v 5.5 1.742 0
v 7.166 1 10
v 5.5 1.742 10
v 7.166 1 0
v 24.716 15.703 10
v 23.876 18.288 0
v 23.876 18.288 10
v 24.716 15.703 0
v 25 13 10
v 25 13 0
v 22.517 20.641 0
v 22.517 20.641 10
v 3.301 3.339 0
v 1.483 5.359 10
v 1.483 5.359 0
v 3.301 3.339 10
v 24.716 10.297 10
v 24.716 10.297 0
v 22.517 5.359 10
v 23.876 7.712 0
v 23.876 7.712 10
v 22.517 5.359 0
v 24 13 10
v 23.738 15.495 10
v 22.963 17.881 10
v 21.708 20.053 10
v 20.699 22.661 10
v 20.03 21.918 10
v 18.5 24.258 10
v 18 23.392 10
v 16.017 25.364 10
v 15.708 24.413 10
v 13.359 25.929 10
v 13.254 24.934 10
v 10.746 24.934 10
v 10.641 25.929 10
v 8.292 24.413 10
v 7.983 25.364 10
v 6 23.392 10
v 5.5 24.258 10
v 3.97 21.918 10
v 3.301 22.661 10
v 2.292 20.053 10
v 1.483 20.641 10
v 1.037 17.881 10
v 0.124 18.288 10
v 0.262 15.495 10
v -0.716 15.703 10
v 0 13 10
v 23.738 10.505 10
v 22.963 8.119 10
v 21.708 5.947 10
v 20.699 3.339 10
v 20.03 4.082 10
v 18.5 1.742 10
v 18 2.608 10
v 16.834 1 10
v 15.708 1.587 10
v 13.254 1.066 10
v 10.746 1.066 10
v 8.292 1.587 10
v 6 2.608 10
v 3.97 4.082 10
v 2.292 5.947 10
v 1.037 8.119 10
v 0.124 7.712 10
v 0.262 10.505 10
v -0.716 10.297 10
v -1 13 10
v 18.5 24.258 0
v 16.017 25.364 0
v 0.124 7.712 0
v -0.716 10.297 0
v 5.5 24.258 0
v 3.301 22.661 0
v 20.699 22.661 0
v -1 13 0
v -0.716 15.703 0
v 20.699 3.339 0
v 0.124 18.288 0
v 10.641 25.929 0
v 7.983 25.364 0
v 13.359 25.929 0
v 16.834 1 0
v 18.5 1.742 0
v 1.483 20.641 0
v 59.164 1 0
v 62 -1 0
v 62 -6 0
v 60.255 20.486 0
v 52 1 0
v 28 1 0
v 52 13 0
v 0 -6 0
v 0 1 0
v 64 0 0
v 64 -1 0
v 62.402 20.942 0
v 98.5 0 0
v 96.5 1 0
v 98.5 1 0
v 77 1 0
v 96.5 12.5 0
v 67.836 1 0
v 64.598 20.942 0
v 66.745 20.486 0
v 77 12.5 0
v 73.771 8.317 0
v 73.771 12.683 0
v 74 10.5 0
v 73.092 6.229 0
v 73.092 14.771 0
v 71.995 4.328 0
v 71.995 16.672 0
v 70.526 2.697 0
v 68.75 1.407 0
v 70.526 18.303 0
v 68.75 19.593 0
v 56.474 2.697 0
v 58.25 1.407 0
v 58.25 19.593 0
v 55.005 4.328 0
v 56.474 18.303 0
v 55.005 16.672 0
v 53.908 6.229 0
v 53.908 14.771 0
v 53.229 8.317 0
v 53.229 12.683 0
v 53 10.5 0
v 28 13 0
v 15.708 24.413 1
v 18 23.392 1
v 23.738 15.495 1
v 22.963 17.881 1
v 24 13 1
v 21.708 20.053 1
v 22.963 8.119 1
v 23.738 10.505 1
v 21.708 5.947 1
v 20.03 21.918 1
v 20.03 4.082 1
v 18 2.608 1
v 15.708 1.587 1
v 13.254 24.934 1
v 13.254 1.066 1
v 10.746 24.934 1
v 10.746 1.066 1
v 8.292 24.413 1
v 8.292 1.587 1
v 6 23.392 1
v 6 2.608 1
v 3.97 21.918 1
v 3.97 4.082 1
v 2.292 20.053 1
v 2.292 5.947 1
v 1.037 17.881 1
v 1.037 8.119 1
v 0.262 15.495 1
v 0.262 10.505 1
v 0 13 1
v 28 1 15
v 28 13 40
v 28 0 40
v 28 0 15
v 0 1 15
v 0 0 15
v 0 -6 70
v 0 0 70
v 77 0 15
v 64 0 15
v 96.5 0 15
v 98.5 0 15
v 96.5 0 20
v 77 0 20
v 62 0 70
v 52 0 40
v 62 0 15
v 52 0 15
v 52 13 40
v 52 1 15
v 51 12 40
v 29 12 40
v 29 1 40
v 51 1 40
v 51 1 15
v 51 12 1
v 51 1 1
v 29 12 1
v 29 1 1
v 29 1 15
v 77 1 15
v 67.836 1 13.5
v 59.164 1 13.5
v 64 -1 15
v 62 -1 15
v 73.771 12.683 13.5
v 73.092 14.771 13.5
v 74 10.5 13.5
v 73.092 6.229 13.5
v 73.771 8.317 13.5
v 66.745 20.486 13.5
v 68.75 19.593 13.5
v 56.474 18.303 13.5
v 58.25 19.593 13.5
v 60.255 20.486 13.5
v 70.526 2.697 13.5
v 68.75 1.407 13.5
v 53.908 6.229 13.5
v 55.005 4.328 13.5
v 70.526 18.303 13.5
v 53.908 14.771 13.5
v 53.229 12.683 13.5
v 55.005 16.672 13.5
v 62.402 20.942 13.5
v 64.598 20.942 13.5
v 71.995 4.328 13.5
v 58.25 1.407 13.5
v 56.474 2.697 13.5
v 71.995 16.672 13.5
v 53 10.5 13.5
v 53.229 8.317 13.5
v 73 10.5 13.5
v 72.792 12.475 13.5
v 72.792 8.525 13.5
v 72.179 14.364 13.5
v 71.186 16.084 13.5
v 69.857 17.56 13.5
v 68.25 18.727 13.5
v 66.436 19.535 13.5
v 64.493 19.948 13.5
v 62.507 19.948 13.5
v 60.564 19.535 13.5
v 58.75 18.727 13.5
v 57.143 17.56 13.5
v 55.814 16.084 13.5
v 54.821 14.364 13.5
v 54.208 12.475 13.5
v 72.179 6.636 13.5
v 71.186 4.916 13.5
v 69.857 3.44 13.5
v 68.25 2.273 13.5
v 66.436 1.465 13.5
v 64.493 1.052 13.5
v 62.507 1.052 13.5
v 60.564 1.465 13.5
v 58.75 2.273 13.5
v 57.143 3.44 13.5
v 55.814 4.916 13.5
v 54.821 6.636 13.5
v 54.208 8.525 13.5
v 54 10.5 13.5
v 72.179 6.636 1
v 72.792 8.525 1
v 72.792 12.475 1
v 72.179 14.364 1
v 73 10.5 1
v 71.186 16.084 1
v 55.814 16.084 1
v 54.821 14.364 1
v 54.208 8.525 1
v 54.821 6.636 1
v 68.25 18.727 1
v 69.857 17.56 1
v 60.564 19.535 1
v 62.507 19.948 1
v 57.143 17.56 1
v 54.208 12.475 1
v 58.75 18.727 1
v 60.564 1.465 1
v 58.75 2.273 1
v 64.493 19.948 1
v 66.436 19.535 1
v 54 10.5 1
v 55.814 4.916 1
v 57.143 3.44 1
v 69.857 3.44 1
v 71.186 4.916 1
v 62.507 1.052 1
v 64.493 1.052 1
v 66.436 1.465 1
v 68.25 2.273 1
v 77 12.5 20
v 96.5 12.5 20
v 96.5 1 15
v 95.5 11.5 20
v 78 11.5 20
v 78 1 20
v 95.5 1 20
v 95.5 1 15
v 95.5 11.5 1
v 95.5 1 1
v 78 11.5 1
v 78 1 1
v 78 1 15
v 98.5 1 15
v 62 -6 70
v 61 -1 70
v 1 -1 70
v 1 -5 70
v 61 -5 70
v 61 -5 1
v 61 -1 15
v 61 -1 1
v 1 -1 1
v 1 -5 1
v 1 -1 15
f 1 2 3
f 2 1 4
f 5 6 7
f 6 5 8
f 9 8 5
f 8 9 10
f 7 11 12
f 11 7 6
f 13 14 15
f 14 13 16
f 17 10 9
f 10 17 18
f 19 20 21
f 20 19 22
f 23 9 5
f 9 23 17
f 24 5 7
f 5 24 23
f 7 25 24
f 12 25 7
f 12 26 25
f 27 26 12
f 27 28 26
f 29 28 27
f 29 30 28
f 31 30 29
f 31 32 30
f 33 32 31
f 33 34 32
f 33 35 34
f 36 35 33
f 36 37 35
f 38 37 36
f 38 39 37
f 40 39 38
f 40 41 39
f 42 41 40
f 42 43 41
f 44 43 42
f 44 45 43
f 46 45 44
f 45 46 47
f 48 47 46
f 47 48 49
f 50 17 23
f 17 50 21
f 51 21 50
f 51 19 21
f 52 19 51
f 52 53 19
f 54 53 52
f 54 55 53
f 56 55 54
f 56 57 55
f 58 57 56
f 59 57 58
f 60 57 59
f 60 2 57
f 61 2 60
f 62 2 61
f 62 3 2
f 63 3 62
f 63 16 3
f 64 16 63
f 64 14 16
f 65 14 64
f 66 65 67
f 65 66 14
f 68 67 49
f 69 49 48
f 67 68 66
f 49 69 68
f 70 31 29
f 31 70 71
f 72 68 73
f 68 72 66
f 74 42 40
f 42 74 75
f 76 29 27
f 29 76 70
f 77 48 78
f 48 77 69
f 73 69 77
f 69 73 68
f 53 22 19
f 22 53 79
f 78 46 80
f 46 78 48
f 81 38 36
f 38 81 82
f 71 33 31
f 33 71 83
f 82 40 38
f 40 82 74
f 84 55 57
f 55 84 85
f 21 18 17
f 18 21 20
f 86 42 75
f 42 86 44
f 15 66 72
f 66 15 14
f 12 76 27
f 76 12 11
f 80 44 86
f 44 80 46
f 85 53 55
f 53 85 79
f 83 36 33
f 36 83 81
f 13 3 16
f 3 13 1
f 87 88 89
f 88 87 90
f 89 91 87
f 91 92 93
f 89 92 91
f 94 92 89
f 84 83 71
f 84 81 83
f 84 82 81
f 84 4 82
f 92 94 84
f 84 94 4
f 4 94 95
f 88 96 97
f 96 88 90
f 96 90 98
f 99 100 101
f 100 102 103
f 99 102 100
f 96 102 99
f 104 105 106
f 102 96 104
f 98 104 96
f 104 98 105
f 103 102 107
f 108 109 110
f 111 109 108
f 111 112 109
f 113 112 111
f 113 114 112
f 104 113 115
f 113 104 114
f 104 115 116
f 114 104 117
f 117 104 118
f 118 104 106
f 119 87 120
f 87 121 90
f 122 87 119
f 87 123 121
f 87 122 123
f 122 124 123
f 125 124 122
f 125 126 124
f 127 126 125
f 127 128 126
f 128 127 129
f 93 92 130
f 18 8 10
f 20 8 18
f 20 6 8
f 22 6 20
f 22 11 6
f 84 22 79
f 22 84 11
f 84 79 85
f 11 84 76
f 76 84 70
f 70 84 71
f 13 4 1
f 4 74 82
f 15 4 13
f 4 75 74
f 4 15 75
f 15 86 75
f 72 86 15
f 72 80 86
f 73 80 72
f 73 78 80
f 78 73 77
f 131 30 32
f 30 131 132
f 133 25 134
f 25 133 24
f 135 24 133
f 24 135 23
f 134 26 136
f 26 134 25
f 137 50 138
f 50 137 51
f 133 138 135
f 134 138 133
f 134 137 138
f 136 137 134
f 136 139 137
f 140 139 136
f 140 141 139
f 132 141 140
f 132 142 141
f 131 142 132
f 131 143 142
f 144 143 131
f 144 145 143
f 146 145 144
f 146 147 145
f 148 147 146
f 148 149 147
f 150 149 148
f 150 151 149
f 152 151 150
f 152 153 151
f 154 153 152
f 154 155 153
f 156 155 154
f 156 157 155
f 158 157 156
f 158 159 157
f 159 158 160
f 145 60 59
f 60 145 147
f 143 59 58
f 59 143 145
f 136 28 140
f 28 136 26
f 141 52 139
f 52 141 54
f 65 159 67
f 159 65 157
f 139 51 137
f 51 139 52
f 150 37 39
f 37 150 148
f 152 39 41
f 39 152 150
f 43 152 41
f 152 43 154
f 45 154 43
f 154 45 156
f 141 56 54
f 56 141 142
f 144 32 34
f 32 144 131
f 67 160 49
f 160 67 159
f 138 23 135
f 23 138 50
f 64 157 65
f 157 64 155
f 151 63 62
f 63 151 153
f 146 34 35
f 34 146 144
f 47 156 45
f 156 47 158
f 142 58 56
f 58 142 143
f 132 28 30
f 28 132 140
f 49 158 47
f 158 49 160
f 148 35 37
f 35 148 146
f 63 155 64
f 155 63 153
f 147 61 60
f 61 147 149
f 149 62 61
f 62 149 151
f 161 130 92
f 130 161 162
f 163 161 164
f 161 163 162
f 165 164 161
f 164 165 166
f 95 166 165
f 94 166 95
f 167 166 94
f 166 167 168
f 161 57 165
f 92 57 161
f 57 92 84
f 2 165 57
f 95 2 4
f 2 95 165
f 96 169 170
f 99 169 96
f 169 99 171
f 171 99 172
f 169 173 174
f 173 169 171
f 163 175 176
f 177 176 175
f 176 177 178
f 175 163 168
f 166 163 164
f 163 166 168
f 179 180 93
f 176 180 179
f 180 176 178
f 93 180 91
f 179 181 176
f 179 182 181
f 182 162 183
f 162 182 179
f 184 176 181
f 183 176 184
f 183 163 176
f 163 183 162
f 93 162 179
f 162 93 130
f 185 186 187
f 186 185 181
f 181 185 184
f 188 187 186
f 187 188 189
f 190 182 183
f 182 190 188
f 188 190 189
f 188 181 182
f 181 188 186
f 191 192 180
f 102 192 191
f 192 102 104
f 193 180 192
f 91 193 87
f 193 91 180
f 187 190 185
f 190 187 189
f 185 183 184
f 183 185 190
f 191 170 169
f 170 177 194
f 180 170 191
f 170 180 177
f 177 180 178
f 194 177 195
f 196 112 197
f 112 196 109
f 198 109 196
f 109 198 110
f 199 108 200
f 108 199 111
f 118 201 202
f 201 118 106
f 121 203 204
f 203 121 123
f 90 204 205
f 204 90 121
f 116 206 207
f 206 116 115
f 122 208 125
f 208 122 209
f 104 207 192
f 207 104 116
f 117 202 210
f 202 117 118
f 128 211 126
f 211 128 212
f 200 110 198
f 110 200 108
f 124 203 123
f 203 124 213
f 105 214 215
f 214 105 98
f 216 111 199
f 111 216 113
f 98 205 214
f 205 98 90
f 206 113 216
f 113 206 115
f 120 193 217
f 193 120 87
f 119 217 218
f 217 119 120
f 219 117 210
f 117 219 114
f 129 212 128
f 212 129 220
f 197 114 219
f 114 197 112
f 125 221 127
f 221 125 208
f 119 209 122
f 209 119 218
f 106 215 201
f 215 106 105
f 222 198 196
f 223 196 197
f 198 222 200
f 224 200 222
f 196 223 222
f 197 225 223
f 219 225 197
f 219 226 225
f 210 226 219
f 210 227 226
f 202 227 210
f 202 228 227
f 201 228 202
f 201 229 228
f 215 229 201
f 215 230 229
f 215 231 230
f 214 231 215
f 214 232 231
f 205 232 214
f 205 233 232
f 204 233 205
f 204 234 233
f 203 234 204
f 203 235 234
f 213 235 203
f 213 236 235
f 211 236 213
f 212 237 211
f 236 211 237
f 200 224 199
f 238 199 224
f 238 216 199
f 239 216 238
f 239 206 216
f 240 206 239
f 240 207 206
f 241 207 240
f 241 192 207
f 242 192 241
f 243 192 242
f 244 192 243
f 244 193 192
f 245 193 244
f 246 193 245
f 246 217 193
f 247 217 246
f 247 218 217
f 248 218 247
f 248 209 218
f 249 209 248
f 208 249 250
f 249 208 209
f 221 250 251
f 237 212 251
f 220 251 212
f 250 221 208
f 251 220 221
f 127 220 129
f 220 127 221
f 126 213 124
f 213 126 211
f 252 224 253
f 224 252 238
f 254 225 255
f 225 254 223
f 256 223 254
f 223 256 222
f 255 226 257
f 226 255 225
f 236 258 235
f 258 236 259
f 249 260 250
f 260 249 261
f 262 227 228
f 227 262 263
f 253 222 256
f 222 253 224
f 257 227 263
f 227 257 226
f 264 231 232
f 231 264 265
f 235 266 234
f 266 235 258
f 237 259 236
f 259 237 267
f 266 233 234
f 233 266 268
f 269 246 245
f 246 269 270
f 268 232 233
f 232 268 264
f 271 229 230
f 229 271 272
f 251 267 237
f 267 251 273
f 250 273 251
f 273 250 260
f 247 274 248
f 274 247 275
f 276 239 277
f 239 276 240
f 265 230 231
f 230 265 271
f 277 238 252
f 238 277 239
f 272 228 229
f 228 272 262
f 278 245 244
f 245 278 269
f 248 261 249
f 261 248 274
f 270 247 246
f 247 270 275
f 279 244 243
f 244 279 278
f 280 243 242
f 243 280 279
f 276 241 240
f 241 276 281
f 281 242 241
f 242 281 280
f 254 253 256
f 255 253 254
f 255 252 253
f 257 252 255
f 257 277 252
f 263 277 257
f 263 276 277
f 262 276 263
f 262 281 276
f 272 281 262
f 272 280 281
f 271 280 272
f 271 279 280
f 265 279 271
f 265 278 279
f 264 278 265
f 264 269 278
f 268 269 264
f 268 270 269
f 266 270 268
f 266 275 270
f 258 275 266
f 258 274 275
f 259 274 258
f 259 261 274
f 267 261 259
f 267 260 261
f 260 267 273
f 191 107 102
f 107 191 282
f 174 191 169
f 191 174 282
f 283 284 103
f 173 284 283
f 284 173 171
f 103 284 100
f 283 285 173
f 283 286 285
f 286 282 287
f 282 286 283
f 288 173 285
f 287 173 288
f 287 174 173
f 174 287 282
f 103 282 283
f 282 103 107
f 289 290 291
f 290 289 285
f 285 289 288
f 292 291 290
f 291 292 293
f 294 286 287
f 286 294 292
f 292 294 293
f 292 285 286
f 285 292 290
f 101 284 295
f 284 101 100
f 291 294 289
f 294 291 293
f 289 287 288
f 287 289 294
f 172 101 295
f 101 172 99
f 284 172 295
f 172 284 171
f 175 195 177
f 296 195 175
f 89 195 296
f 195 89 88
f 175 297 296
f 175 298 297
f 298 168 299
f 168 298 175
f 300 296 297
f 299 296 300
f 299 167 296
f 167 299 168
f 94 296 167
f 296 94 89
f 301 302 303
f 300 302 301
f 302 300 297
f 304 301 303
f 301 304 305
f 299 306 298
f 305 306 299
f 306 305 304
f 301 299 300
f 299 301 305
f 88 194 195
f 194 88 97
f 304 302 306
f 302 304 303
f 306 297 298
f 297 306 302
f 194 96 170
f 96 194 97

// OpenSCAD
// Pocket organizer


slots = [[0, [24, 10]], [1, [22, 11, 40]], [0, [19, 13.5, 45]], [1, [17.5, 10.5, 20]]];
back_slots = [[1, [60, 4, 70]]];
h = 15;
wall = 1;
extra_space = 2;
base = 1;
bottom_wall = 1;

module slot_generator(slots=slots, offset=0, i=0, direction=1) {
      echo(offset, i);     
      s = slots[i][1];
      slot_type = slots[i][0];
      if (slot_type == 0)
        round_slot(slots, offset, i);
      else
        rectangular_slot(slots, offset, i);
      if (i < len(slots)-1) {
          o2 = offset + s.x + 2*wall + extra_space;
          slot_generator(slots, o2, i+1);
      }
  }
 
  
  module rectangular_slot(slots, offset, i) {
      s = slots[i][1];
      inner = [s.x, s.y, s.z];
      outer = [s.x+2*wall, s.y+2*wall, s.z];
      translate([offset, 0, 0]) {
        translate([0, 0, 0]) cube([outer.x+extra_space, base, h]);  
        difference(){
          cube(outer);
          translate([wall, wall, bottom_wall]) cube(inner);
        }
      }
      
  }
  module round_slot(slots, offset, i) {
      s = slots[i][1];
      inner = [s.x, s.y];
      outer = [s.x+2*wall, s.y];
      translate([offset, 0, 0]) {
        translate([0, 0, 0]) cube([outer.x+extra_space, base, h]);  
      translate([0.5*s.x, 0.5*outer.x, 0]) difference(){
          cylinder(d=outer.x, h=outer.y);
          translate([0, 0, bottom_wall]) cylinder(d=inner[0], h=inner[1]);
        }
      }
  }
  
 slot_generator();
 //translate([0, wall, 0]) 
 translate([0, 0, 0])
   mirror([0,1,0]) slot_generator(slots=back_slots);
